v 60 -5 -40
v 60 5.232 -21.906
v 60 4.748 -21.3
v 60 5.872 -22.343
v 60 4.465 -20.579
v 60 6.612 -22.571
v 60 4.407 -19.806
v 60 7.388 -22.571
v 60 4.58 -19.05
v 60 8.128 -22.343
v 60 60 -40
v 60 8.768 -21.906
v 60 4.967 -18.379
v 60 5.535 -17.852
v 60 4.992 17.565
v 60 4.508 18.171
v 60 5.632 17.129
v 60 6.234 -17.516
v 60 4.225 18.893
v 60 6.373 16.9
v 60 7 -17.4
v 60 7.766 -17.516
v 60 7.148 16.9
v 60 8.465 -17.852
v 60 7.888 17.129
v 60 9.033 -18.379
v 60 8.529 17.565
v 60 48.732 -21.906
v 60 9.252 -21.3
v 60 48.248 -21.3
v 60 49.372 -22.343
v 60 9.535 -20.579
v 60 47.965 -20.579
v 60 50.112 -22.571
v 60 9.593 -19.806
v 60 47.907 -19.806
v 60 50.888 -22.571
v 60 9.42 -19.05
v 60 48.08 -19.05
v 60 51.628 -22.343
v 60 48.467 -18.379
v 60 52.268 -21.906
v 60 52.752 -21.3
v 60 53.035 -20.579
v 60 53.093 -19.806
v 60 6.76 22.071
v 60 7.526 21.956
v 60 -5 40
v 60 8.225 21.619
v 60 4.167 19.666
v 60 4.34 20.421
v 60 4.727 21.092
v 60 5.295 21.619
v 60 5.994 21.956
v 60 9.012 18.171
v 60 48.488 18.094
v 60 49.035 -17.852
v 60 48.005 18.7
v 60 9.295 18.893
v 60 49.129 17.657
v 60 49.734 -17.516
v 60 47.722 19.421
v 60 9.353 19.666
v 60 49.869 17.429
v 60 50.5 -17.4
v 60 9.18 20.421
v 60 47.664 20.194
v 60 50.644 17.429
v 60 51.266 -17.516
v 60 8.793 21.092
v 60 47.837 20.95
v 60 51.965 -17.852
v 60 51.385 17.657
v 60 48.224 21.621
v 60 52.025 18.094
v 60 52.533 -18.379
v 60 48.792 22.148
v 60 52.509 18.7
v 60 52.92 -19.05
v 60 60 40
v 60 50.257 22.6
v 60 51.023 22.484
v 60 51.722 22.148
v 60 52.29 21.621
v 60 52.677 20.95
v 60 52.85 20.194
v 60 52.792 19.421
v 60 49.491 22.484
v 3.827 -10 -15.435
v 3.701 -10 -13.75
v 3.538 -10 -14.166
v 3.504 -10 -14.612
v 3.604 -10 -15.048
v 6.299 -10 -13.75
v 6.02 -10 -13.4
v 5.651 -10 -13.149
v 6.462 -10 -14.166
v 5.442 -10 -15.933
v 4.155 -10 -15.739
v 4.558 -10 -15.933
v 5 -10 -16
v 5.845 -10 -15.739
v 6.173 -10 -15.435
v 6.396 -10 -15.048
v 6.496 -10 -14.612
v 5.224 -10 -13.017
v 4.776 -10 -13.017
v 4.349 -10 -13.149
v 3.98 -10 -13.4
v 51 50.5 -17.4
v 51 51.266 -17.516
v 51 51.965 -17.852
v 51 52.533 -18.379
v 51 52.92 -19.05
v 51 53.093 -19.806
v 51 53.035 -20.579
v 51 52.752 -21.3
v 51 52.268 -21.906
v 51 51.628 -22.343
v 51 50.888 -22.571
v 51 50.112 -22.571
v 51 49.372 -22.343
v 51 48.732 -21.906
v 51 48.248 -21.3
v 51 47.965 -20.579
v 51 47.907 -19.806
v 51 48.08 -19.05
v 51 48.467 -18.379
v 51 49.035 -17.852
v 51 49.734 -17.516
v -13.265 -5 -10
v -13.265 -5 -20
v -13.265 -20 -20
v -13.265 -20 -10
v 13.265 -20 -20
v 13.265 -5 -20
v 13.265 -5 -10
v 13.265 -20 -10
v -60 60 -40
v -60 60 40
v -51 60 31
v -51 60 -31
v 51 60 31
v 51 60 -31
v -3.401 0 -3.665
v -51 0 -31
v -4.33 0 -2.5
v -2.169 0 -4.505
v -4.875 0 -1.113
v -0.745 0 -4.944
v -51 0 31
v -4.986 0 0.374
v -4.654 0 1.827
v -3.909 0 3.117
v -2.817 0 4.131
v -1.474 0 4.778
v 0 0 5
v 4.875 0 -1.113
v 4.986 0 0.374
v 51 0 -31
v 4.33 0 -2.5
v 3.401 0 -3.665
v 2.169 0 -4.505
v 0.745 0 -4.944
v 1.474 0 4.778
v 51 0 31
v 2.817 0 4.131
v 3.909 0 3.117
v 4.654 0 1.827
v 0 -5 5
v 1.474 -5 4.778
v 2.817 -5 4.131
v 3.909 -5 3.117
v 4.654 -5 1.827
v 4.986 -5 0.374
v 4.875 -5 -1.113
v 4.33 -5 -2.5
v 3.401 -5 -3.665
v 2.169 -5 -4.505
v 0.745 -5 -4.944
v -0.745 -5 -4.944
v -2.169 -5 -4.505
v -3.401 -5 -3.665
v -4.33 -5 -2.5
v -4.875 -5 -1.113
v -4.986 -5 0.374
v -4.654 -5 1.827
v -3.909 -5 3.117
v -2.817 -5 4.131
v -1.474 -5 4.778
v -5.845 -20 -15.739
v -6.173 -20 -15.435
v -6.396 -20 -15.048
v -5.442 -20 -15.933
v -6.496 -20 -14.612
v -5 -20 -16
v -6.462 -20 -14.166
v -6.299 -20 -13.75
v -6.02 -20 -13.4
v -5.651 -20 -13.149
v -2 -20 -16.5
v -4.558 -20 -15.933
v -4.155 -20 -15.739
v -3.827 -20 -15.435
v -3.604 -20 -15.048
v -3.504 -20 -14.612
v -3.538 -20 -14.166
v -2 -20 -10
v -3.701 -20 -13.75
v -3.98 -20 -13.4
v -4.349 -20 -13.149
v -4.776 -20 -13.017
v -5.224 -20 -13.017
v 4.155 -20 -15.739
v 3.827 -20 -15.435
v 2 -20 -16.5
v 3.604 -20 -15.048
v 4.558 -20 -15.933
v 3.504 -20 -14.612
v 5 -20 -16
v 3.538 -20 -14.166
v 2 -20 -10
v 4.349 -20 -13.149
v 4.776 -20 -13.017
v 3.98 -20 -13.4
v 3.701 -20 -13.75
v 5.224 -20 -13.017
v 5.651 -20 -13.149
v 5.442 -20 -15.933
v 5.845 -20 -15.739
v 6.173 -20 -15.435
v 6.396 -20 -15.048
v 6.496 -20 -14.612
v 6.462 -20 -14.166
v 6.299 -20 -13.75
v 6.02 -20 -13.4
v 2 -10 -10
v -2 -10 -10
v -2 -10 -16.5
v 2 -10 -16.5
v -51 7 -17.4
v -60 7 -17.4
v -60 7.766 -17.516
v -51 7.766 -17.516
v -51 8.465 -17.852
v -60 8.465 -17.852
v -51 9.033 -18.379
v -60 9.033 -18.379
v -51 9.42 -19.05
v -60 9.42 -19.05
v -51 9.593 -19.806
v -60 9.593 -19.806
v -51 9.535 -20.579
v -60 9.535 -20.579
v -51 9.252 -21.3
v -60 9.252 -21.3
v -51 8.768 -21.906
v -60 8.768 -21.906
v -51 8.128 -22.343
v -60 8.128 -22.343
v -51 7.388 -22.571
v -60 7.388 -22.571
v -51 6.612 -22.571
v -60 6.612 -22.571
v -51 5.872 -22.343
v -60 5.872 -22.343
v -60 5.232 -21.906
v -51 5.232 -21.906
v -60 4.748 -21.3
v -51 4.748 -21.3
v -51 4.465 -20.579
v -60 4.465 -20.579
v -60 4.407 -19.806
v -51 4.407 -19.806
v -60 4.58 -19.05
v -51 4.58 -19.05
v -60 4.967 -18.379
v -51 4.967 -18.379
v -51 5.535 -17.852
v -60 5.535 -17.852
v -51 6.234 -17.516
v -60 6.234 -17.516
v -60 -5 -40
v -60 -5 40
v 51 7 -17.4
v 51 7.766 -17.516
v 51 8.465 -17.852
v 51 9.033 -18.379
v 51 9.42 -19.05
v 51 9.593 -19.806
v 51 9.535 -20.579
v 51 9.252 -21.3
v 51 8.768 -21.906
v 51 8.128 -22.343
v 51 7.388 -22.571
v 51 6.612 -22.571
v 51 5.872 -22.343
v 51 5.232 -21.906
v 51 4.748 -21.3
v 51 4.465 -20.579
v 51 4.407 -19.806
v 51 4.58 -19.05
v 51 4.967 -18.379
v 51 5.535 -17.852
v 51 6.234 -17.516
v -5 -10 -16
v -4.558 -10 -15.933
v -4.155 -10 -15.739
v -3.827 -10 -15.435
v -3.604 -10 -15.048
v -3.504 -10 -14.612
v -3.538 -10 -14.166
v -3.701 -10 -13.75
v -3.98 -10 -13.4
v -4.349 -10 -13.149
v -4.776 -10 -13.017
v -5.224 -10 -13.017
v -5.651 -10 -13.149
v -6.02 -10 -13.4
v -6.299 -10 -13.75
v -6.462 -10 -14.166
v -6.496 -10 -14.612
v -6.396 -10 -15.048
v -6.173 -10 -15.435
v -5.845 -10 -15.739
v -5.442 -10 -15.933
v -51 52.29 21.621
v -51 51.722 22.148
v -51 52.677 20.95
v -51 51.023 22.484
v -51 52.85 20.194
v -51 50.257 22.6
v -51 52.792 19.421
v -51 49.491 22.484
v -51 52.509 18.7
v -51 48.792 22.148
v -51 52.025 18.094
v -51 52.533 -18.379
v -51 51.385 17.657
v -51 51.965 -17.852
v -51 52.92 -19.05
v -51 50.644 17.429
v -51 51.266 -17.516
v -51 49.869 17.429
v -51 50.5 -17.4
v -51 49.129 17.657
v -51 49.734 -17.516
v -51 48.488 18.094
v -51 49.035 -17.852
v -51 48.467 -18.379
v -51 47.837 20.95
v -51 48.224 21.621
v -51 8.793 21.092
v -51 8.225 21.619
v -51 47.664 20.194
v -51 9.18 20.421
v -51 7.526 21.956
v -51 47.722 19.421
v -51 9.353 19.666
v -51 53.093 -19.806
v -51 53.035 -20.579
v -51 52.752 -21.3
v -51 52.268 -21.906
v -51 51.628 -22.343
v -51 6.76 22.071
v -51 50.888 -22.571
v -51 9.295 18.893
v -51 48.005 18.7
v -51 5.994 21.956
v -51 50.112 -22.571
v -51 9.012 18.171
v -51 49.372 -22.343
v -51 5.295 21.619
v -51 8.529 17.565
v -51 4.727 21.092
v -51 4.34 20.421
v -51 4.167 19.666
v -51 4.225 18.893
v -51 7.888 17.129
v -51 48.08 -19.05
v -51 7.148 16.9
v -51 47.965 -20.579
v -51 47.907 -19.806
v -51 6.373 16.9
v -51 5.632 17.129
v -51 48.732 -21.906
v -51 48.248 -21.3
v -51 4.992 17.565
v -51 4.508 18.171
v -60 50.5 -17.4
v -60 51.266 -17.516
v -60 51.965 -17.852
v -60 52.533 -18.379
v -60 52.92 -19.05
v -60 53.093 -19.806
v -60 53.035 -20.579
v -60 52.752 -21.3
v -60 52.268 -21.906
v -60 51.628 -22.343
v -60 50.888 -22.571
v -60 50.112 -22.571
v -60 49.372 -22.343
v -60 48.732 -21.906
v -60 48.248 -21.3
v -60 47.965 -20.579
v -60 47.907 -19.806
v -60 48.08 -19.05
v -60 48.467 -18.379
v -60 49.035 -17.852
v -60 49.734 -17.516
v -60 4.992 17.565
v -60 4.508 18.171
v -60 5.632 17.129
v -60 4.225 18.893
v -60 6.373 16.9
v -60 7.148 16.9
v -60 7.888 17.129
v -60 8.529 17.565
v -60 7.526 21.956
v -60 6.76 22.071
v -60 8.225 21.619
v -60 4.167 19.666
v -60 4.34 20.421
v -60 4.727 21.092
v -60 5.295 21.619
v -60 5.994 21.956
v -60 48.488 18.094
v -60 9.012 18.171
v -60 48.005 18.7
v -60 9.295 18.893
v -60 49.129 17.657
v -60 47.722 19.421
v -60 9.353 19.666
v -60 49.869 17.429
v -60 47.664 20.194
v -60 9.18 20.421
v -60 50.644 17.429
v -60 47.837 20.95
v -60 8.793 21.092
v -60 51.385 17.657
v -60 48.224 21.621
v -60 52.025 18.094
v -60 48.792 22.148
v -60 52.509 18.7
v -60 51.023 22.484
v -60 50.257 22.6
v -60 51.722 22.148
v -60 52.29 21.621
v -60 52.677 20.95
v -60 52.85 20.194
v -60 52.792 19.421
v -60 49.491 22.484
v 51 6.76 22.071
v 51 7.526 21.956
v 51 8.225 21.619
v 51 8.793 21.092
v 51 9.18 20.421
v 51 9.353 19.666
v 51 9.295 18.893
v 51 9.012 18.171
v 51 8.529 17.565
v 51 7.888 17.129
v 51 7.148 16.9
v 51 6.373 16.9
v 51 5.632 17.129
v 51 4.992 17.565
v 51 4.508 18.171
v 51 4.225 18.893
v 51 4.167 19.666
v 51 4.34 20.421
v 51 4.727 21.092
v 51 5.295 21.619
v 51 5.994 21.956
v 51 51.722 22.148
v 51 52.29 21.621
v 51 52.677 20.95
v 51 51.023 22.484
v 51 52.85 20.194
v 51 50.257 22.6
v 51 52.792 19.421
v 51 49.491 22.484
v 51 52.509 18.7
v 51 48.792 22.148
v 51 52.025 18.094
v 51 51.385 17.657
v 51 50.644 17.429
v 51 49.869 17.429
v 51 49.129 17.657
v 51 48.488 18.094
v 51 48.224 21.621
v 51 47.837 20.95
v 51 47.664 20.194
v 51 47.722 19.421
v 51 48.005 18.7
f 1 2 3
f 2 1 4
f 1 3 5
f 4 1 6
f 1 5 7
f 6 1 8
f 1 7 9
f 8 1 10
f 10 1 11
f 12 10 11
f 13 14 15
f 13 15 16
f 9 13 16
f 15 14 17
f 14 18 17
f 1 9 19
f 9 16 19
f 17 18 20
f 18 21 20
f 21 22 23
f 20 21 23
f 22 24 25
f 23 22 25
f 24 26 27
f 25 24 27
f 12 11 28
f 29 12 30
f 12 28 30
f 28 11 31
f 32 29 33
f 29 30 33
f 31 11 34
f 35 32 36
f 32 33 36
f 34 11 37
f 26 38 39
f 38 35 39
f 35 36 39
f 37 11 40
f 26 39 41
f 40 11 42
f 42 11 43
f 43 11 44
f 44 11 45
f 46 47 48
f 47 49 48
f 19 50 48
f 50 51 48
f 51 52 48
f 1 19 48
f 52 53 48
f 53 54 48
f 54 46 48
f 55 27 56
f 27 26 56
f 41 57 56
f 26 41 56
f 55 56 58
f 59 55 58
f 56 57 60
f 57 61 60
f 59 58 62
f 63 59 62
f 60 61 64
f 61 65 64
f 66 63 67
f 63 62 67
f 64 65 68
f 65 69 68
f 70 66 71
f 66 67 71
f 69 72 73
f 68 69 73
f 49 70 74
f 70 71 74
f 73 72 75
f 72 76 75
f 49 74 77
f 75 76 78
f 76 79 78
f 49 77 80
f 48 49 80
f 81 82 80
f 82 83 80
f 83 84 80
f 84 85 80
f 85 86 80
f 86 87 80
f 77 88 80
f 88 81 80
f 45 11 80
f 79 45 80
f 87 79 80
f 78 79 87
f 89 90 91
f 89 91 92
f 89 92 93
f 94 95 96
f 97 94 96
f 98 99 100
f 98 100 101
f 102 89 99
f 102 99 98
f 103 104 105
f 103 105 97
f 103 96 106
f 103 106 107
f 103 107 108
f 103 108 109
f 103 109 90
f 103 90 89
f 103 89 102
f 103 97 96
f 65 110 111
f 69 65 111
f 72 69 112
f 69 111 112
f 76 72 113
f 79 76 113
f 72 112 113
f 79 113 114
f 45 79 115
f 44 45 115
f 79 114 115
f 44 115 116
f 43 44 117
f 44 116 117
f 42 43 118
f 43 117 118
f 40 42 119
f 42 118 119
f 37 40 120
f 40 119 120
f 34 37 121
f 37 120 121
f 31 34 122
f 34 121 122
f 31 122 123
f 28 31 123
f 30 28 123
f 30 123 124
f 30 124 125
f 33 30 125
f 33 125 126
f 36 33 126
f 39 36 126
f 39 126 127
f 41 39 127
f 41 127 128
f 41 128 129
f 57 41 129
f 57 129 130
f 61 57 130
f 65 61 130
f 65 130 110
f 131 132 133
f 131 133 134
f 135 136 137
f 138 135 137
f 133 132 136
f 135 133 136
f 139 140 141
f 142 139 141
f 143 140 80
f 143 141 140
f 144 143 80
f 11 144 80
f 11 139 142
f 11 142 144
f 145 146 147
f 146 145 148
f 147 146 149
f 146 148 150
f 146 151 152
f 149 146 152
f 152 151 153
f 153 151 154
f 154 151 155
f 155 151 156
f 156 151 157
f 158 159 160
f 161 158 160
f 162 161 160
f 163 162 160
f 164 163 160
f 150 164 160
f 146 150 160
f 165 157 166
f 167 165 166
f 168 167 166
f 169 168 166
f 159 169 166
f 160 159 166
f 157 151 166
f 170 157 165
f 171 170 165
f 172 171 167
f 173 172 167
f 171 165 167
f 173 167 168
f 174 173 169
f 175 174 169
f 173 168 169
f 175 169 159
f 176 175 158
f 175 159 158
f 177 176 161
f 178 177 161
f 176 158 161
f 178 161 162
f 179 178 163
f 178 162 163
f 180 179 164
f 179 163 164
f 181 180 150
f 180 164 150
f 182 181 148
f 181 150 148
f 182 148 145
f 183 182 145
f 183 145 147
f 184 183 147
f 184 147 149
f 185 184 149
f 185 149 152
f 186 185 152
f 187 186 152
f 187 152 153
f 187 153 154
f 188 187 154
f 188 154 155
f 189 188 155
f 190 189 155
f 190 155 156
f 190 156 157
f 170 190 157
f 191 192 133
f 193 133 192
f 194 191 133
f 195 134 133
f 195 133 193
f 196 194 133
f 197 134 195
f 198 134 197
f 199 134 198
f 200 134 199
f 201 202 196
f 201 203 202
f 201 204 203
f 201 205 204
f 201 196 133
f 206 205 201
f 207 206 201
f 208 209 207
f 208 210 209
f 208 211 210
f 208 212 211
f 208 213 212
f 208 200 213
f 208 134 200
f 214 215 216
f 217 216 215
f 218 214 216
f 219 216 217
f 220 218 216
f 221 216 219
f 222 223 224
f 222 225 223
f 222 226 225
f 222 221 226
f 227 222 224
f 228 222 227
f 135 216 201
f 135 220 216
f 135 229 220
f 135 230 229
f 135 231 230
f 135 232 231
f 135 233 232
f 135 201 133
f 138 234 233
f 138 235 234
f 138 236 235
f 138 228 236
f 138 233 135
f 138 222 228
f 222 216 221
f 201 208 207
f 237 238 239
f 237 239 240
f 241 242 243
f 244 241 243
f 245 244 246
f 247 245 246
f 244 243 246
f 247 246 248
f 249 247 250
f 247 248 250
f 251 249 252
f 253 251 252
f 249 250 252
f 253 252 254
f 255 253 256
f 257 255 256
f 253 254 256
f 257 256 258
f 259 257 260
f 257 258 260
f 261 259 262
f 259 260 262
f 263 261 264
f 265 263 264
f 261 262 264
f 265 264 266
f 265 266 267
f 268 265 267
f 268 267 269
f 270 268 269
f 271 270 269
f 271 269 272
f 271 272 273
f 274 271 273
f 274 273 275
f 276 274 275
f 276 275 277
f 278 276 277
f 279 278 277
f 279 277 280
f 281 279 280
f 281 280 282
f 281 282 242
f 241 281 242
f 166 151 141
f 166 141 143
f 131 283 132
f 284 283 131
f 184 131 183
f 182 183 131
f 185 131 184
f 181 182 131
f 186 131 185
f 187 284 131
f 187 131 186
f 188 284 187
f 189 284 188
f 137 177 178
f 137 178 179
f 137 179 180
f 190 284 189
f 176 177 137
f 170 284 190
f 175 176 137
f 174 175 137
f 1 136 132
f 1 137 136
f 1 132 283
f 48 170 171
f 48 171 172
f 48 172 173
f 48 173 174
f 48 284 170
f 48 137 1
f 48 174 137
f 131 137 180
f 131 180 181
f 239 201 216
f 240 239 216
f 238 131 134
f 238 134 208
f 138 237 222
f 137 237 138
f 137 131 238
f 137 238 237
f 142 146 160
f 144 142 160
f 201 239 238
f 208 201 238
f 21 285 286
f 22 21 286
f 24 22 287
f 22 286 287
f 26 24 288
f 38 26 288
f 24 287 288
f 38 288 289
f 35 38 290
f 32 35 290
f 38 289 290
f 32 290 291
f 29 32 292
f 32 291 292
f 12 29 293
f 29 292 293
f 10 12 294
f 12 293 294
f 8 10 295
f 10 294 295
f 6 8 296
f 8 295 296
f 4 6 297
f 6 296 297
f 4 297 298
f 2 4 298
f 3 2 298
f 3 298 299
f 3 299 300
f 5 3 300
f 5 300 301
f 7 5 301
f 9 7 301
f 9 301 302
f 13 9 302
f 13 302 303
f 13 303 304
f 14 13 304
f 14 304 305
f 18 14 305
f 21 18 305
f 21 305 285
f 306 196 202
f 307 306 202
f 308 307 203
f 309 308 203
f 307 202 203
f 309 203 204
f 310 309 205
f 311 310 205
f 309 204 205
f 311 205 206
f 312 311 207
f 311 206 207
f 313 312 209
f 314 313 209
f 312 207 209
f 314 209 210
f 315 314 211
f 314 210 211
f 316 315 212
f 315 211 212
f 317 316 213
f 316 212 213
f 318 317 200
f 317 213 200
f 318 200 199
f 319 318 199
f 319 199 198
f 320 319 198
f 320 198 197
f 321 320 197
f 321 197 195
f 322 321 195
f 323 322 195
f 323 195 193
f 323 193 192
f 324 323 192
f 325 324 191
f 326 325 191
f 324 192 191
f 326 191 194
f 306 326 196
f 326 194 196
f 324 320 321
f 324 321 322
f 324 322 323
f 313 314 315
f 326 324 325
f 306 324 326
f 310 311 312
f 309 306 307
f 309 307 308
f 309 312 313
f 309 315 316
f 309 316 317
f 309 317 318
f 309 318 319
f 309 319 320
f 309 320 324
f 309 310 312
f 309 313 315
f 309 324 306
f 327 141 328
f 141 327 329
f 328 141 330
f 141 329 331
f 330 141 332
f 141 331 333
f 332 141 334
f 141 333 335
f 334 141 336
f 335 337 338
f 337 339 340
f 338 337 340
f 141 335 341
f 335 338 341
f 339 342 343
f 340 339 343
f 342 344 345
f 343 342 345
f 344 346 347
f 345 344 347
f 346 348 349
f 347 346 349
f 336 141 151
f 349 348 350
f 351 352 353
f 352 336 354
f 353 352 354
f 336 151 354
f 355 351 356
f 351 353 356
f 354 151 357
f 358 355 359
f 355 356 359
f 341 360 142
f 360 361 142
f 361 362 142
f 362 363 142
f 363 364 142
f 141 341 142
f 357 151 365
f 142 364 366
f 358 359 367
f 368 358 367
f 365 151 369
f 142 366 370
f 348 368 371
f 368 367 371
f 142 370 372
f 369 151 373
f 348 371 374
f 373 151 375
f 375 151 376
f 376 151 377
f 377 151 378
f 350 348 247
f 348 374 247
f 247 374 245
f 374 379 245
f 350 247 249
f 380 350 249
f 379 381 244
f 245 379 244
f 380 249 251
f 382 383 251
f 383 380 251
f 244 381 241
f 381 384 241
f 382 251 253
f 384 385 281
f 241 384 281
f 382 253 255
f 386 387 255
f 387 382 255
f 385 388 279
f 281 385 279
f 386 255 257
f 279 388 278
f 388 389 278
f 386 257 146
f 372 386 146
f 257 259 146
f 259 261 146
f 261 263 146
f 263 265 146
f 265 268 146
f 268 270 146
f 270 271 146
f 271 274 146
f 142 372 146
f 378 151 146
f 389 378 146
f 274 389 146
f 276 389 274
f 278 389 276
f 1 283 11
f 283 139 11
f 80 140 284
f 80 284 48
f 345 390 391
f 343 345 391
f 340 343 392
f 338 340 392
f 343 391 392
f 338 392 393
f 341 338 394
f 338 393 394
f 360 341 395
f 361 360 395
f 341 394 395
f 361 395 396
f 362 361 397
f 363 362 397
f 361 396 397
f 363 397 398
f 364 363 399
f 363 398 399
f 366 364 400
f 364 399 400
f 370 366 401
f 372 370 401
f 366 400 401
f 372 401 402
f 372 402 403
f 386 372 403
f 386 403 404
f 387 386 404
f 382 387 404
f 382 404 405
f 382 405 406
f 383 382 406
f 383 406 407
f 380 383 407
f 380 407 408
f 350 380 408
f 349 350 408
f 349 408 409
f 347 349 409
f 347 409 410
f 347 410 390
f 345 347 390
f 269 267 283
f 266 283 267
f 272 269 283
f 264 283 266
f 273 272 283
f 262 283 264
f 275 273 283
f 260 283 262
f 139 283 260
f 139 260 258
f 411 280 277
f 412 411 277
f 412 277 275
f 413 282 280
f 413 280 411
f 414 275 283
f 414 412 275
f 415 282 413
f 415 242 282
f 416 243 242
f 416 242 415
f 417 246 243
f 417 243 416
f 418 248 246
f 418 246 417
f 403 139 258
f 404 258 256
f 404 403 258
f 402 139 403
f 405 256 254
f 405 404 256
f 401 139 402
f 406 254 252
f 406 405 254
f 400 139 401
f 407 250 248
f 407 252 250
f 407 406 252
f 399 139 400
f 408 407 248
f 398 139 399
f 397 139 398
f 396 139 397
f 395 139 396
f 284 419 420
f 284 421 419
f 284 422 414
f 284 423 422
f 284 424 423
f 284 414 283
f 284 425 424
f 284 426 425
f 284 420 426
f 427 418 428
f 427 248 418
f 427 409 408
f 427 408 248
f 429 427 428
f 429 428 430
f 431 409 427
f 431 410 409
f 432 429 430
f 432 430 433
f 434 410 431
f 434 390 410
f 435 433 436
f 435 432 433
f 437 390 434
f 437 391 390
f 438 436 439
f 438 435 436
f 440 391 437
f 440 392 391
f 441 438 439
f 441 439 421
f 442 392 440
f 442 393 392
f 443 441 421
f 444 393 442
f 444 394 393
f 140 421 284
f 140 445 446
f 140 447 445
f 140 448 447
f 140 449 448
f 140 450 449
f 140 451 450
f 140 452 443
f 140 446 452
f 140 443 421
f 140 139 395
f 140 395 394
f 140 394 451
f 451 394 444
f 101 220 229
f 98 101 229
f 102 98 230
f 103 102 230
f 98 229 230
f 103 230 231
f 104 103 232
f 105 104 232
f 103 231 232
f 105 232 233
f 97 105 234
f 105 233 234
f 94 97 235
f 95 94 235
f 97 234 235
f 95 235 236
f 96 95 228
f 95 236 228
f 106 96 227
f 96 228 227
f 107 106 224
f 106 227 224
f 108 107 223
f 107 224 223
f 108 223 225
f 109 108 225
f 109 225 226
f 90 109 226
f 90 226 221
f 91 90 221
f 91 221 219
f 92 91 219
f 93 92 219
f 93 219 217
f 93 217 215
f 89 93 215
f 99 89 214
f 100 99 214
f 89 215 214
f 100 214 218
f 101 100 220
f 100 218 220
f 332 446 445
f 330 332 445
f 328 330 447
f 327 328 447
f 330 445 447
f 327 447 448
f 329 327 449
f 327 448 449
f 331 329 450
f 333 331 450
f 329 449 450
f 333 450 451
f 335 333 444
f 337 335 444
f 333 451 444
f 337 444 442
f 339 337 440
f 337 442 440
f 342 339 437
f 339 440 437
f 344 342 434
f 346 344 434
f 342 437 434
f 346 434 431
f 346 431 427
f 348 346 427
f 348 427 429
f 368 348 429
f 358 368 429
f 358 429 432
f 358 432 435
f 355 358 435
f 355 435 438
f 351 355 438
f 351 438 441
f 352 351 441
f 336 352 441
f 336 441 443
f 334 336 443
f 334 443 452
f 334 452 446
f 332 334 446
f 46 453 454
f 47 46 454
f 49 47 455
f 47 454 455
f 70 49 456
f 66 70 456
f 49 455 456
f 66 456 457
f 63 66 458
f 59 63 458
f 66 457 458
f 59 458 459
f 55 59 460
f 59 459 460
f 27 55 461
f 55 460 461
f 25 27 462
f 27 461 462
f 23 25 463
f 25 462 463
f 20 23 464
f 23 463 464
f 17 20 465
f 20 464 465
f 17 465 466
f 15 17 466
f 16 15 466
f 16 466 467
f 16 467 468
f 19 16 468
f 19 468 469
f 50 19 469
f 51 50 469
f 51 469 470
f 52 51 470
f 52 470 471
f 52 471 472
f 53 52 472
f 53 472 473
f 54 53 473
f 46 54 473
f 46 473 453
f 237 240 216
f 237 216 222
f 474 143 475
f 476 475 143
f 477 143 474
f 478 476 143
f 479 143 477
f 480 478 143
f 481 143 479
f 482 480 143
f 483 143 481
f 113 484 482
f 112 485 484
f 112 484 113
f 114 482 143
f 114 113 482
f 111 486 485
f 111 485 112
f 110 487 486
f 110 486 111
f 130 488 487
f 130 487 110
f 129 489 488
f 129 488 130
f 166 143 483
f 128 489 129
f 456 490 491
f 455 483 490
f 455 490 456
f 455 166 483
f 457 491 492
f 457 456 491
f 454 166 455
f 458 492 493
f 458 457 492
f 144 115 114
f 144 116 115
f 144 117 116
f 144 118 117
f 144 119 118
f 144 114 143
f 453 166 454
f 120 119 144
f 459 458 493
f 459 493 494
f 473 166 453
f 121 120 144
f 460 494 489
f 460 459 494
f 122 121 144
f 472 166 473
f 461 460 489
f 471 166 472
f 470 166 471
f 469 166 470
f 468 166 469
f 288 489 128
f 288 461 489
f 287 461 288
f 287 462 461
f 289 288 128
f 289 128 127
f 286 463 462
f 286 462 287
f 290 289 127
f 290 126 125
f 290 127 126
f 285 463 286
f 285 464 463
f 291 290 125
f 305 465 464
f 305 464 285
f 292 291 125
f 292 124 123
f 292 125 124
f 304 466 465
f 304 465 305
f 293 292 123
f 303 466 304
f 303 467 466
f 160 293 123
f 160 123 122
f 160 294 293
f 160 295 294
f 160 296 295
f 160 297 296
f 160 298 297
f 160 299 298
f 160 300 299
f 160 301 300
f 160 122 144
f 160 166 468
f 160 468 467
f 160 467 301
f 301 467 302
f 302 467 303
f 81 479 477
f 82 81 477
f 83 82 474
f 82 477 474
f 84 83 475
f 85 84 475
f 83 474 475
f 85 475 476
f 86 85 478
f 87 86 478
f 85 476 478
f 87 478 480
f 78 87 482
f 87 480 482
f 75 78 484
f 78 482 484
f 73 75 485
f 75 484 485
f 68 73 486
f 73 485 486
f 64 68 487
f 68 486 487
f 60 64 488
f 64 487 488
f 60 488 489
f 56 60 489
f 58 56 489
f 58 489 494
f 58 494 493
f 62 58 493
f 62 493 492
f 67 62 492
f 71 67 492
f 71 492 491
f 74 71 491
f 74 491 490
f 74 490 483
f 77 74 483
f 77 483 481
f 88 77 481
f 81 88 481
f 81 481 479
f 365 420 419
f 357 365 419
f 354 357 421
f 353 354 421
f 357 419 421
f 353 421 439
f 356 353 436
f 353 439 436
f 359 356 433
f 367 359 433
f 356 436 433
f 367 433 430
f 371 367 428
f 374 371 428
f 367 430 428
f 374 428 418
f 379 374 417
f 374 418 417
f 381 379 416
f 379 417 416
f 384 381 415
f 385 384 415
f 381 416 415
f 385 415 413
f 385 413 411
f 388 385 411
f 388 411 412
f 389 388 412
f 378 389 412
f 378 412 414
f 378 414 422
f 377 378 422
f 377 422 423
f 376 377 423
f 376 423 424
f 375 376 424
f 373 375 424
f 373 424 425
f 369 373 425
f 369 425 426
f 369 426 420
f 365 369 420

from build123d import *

# Parameters (mm, degrees)
SKETCH1_W           = 120
SKETCH1_H           = 80
SKETCH1_W_2         = 102
SKETCH1_H_2         = 62
BOSS_EXTRUDE1_DEPTH = 60
SKETCH2_W           = 120
SKETCH2_H           = 80
BOSS_EXTRUDE2_DEPTH = 5
SKETCH5_R           = 2.6
CUT_EXTRUDE1_DEPTH  = 141
SKETCH6_R           = 5
CUT_EXTRUDE2_DEPTH  = 94.808315196
SKETCH7_W           = 26.53085
SKETCH7_H           = 10
BOSS_EXTRUDE3_DEPTH = 15
SKETCH8_W           = 4
SKETCH8_H           = 6.5
SKETCH8_R           = 1.5
CUT_EXTRUDE3_DEPTH  = 10


with BuildPart() as part:
    # Sketch1 → Boss-Extrude1 (new body)
    with BuildSketch(Plane(origin=(0, 0, 0), x_dir=(1, 0, 0), z_dir=(0, 1, 0))):
        Rectangle(SKETCH1_W, SKETCH1_H)
        Rectangle(SKETCH1_W_2, SKETCH1_H_2, mode=Mode.SUBTRACT)
    extrude(amount=BOSS_EXTRUDE1_DEPTH)

    # Sketch2 → Boss-Extrude2 (add)
    with BuildSketch(Plane.XZ):
        Rectangle(SKETCH2_W, SKETCH2_H)
    extrude(amount=BOSS_EXTRUDE2_DEPTH)

    # Sketch5 → Cut-Extrude1 (cut, through all)
    with BuildSketch(Plane.ZY.offset(60)):
        with Locations((-20, 50.5)):
            Circle(SKETCH5_R)
        with Locations((20, 50.25689587)):
            Circle(SKETCH5_R)
        with Locations((-20, 7)):
            Circle(SKETCH5_R)
        with Locations((19.471268046, 6.760109293)):
            Circle(SKETCH5_R)
    extrude(amount=-CUT_EXTRUDE1_DEPTH, mode=Mode.SUBTRACT)

    # Sketch6 → Cut-Extrude2 (cut, through all)
    with BuildSketch(Plane(origin=(0, 0, 0), x_dir=(1, 0, 0), z_dir=(0, 1, 0))):
        with Locations(Location((0, 0, 0), (0, 0, 270))):
            Circle(SKETCH6_R)
    extrude(amount=-CUT_EXTRUDE2_DEPTH, mode=Mode.SUBTRACT)

    # Sketch7 → Boss-Extrude3 (add)
    with BuildSketch(Plane.XZ.offset(5)):
        with Locations((0, -15)):
            Rectangle(SKETCH7_W, SKETCH7_H)
    extrude(amount=BOSS_EXTRUDE3_DEPTH)

    # Sketch8 → Cut-Extrude3 (cut)
    with BuildSketch(Plane.XZ.offset(20)):
        with Locations((0, -13.25)):
            Rectangle(SKETCH8_W, SKETCH8_H)
        with Locations(Location((-5.000005, -14.5, 0), (0, 0, 270))):
            Circle(SKETCH8_R)
        with Locations(Location((5.000005, -14.5, 0), (0, 0, 270))):
            Circle(SKETCH8_R)
    extrude(amount=-CUT_EXTRUDE3_DEPTH, mode=Mode.SUBTRACT)


solid = part.part
